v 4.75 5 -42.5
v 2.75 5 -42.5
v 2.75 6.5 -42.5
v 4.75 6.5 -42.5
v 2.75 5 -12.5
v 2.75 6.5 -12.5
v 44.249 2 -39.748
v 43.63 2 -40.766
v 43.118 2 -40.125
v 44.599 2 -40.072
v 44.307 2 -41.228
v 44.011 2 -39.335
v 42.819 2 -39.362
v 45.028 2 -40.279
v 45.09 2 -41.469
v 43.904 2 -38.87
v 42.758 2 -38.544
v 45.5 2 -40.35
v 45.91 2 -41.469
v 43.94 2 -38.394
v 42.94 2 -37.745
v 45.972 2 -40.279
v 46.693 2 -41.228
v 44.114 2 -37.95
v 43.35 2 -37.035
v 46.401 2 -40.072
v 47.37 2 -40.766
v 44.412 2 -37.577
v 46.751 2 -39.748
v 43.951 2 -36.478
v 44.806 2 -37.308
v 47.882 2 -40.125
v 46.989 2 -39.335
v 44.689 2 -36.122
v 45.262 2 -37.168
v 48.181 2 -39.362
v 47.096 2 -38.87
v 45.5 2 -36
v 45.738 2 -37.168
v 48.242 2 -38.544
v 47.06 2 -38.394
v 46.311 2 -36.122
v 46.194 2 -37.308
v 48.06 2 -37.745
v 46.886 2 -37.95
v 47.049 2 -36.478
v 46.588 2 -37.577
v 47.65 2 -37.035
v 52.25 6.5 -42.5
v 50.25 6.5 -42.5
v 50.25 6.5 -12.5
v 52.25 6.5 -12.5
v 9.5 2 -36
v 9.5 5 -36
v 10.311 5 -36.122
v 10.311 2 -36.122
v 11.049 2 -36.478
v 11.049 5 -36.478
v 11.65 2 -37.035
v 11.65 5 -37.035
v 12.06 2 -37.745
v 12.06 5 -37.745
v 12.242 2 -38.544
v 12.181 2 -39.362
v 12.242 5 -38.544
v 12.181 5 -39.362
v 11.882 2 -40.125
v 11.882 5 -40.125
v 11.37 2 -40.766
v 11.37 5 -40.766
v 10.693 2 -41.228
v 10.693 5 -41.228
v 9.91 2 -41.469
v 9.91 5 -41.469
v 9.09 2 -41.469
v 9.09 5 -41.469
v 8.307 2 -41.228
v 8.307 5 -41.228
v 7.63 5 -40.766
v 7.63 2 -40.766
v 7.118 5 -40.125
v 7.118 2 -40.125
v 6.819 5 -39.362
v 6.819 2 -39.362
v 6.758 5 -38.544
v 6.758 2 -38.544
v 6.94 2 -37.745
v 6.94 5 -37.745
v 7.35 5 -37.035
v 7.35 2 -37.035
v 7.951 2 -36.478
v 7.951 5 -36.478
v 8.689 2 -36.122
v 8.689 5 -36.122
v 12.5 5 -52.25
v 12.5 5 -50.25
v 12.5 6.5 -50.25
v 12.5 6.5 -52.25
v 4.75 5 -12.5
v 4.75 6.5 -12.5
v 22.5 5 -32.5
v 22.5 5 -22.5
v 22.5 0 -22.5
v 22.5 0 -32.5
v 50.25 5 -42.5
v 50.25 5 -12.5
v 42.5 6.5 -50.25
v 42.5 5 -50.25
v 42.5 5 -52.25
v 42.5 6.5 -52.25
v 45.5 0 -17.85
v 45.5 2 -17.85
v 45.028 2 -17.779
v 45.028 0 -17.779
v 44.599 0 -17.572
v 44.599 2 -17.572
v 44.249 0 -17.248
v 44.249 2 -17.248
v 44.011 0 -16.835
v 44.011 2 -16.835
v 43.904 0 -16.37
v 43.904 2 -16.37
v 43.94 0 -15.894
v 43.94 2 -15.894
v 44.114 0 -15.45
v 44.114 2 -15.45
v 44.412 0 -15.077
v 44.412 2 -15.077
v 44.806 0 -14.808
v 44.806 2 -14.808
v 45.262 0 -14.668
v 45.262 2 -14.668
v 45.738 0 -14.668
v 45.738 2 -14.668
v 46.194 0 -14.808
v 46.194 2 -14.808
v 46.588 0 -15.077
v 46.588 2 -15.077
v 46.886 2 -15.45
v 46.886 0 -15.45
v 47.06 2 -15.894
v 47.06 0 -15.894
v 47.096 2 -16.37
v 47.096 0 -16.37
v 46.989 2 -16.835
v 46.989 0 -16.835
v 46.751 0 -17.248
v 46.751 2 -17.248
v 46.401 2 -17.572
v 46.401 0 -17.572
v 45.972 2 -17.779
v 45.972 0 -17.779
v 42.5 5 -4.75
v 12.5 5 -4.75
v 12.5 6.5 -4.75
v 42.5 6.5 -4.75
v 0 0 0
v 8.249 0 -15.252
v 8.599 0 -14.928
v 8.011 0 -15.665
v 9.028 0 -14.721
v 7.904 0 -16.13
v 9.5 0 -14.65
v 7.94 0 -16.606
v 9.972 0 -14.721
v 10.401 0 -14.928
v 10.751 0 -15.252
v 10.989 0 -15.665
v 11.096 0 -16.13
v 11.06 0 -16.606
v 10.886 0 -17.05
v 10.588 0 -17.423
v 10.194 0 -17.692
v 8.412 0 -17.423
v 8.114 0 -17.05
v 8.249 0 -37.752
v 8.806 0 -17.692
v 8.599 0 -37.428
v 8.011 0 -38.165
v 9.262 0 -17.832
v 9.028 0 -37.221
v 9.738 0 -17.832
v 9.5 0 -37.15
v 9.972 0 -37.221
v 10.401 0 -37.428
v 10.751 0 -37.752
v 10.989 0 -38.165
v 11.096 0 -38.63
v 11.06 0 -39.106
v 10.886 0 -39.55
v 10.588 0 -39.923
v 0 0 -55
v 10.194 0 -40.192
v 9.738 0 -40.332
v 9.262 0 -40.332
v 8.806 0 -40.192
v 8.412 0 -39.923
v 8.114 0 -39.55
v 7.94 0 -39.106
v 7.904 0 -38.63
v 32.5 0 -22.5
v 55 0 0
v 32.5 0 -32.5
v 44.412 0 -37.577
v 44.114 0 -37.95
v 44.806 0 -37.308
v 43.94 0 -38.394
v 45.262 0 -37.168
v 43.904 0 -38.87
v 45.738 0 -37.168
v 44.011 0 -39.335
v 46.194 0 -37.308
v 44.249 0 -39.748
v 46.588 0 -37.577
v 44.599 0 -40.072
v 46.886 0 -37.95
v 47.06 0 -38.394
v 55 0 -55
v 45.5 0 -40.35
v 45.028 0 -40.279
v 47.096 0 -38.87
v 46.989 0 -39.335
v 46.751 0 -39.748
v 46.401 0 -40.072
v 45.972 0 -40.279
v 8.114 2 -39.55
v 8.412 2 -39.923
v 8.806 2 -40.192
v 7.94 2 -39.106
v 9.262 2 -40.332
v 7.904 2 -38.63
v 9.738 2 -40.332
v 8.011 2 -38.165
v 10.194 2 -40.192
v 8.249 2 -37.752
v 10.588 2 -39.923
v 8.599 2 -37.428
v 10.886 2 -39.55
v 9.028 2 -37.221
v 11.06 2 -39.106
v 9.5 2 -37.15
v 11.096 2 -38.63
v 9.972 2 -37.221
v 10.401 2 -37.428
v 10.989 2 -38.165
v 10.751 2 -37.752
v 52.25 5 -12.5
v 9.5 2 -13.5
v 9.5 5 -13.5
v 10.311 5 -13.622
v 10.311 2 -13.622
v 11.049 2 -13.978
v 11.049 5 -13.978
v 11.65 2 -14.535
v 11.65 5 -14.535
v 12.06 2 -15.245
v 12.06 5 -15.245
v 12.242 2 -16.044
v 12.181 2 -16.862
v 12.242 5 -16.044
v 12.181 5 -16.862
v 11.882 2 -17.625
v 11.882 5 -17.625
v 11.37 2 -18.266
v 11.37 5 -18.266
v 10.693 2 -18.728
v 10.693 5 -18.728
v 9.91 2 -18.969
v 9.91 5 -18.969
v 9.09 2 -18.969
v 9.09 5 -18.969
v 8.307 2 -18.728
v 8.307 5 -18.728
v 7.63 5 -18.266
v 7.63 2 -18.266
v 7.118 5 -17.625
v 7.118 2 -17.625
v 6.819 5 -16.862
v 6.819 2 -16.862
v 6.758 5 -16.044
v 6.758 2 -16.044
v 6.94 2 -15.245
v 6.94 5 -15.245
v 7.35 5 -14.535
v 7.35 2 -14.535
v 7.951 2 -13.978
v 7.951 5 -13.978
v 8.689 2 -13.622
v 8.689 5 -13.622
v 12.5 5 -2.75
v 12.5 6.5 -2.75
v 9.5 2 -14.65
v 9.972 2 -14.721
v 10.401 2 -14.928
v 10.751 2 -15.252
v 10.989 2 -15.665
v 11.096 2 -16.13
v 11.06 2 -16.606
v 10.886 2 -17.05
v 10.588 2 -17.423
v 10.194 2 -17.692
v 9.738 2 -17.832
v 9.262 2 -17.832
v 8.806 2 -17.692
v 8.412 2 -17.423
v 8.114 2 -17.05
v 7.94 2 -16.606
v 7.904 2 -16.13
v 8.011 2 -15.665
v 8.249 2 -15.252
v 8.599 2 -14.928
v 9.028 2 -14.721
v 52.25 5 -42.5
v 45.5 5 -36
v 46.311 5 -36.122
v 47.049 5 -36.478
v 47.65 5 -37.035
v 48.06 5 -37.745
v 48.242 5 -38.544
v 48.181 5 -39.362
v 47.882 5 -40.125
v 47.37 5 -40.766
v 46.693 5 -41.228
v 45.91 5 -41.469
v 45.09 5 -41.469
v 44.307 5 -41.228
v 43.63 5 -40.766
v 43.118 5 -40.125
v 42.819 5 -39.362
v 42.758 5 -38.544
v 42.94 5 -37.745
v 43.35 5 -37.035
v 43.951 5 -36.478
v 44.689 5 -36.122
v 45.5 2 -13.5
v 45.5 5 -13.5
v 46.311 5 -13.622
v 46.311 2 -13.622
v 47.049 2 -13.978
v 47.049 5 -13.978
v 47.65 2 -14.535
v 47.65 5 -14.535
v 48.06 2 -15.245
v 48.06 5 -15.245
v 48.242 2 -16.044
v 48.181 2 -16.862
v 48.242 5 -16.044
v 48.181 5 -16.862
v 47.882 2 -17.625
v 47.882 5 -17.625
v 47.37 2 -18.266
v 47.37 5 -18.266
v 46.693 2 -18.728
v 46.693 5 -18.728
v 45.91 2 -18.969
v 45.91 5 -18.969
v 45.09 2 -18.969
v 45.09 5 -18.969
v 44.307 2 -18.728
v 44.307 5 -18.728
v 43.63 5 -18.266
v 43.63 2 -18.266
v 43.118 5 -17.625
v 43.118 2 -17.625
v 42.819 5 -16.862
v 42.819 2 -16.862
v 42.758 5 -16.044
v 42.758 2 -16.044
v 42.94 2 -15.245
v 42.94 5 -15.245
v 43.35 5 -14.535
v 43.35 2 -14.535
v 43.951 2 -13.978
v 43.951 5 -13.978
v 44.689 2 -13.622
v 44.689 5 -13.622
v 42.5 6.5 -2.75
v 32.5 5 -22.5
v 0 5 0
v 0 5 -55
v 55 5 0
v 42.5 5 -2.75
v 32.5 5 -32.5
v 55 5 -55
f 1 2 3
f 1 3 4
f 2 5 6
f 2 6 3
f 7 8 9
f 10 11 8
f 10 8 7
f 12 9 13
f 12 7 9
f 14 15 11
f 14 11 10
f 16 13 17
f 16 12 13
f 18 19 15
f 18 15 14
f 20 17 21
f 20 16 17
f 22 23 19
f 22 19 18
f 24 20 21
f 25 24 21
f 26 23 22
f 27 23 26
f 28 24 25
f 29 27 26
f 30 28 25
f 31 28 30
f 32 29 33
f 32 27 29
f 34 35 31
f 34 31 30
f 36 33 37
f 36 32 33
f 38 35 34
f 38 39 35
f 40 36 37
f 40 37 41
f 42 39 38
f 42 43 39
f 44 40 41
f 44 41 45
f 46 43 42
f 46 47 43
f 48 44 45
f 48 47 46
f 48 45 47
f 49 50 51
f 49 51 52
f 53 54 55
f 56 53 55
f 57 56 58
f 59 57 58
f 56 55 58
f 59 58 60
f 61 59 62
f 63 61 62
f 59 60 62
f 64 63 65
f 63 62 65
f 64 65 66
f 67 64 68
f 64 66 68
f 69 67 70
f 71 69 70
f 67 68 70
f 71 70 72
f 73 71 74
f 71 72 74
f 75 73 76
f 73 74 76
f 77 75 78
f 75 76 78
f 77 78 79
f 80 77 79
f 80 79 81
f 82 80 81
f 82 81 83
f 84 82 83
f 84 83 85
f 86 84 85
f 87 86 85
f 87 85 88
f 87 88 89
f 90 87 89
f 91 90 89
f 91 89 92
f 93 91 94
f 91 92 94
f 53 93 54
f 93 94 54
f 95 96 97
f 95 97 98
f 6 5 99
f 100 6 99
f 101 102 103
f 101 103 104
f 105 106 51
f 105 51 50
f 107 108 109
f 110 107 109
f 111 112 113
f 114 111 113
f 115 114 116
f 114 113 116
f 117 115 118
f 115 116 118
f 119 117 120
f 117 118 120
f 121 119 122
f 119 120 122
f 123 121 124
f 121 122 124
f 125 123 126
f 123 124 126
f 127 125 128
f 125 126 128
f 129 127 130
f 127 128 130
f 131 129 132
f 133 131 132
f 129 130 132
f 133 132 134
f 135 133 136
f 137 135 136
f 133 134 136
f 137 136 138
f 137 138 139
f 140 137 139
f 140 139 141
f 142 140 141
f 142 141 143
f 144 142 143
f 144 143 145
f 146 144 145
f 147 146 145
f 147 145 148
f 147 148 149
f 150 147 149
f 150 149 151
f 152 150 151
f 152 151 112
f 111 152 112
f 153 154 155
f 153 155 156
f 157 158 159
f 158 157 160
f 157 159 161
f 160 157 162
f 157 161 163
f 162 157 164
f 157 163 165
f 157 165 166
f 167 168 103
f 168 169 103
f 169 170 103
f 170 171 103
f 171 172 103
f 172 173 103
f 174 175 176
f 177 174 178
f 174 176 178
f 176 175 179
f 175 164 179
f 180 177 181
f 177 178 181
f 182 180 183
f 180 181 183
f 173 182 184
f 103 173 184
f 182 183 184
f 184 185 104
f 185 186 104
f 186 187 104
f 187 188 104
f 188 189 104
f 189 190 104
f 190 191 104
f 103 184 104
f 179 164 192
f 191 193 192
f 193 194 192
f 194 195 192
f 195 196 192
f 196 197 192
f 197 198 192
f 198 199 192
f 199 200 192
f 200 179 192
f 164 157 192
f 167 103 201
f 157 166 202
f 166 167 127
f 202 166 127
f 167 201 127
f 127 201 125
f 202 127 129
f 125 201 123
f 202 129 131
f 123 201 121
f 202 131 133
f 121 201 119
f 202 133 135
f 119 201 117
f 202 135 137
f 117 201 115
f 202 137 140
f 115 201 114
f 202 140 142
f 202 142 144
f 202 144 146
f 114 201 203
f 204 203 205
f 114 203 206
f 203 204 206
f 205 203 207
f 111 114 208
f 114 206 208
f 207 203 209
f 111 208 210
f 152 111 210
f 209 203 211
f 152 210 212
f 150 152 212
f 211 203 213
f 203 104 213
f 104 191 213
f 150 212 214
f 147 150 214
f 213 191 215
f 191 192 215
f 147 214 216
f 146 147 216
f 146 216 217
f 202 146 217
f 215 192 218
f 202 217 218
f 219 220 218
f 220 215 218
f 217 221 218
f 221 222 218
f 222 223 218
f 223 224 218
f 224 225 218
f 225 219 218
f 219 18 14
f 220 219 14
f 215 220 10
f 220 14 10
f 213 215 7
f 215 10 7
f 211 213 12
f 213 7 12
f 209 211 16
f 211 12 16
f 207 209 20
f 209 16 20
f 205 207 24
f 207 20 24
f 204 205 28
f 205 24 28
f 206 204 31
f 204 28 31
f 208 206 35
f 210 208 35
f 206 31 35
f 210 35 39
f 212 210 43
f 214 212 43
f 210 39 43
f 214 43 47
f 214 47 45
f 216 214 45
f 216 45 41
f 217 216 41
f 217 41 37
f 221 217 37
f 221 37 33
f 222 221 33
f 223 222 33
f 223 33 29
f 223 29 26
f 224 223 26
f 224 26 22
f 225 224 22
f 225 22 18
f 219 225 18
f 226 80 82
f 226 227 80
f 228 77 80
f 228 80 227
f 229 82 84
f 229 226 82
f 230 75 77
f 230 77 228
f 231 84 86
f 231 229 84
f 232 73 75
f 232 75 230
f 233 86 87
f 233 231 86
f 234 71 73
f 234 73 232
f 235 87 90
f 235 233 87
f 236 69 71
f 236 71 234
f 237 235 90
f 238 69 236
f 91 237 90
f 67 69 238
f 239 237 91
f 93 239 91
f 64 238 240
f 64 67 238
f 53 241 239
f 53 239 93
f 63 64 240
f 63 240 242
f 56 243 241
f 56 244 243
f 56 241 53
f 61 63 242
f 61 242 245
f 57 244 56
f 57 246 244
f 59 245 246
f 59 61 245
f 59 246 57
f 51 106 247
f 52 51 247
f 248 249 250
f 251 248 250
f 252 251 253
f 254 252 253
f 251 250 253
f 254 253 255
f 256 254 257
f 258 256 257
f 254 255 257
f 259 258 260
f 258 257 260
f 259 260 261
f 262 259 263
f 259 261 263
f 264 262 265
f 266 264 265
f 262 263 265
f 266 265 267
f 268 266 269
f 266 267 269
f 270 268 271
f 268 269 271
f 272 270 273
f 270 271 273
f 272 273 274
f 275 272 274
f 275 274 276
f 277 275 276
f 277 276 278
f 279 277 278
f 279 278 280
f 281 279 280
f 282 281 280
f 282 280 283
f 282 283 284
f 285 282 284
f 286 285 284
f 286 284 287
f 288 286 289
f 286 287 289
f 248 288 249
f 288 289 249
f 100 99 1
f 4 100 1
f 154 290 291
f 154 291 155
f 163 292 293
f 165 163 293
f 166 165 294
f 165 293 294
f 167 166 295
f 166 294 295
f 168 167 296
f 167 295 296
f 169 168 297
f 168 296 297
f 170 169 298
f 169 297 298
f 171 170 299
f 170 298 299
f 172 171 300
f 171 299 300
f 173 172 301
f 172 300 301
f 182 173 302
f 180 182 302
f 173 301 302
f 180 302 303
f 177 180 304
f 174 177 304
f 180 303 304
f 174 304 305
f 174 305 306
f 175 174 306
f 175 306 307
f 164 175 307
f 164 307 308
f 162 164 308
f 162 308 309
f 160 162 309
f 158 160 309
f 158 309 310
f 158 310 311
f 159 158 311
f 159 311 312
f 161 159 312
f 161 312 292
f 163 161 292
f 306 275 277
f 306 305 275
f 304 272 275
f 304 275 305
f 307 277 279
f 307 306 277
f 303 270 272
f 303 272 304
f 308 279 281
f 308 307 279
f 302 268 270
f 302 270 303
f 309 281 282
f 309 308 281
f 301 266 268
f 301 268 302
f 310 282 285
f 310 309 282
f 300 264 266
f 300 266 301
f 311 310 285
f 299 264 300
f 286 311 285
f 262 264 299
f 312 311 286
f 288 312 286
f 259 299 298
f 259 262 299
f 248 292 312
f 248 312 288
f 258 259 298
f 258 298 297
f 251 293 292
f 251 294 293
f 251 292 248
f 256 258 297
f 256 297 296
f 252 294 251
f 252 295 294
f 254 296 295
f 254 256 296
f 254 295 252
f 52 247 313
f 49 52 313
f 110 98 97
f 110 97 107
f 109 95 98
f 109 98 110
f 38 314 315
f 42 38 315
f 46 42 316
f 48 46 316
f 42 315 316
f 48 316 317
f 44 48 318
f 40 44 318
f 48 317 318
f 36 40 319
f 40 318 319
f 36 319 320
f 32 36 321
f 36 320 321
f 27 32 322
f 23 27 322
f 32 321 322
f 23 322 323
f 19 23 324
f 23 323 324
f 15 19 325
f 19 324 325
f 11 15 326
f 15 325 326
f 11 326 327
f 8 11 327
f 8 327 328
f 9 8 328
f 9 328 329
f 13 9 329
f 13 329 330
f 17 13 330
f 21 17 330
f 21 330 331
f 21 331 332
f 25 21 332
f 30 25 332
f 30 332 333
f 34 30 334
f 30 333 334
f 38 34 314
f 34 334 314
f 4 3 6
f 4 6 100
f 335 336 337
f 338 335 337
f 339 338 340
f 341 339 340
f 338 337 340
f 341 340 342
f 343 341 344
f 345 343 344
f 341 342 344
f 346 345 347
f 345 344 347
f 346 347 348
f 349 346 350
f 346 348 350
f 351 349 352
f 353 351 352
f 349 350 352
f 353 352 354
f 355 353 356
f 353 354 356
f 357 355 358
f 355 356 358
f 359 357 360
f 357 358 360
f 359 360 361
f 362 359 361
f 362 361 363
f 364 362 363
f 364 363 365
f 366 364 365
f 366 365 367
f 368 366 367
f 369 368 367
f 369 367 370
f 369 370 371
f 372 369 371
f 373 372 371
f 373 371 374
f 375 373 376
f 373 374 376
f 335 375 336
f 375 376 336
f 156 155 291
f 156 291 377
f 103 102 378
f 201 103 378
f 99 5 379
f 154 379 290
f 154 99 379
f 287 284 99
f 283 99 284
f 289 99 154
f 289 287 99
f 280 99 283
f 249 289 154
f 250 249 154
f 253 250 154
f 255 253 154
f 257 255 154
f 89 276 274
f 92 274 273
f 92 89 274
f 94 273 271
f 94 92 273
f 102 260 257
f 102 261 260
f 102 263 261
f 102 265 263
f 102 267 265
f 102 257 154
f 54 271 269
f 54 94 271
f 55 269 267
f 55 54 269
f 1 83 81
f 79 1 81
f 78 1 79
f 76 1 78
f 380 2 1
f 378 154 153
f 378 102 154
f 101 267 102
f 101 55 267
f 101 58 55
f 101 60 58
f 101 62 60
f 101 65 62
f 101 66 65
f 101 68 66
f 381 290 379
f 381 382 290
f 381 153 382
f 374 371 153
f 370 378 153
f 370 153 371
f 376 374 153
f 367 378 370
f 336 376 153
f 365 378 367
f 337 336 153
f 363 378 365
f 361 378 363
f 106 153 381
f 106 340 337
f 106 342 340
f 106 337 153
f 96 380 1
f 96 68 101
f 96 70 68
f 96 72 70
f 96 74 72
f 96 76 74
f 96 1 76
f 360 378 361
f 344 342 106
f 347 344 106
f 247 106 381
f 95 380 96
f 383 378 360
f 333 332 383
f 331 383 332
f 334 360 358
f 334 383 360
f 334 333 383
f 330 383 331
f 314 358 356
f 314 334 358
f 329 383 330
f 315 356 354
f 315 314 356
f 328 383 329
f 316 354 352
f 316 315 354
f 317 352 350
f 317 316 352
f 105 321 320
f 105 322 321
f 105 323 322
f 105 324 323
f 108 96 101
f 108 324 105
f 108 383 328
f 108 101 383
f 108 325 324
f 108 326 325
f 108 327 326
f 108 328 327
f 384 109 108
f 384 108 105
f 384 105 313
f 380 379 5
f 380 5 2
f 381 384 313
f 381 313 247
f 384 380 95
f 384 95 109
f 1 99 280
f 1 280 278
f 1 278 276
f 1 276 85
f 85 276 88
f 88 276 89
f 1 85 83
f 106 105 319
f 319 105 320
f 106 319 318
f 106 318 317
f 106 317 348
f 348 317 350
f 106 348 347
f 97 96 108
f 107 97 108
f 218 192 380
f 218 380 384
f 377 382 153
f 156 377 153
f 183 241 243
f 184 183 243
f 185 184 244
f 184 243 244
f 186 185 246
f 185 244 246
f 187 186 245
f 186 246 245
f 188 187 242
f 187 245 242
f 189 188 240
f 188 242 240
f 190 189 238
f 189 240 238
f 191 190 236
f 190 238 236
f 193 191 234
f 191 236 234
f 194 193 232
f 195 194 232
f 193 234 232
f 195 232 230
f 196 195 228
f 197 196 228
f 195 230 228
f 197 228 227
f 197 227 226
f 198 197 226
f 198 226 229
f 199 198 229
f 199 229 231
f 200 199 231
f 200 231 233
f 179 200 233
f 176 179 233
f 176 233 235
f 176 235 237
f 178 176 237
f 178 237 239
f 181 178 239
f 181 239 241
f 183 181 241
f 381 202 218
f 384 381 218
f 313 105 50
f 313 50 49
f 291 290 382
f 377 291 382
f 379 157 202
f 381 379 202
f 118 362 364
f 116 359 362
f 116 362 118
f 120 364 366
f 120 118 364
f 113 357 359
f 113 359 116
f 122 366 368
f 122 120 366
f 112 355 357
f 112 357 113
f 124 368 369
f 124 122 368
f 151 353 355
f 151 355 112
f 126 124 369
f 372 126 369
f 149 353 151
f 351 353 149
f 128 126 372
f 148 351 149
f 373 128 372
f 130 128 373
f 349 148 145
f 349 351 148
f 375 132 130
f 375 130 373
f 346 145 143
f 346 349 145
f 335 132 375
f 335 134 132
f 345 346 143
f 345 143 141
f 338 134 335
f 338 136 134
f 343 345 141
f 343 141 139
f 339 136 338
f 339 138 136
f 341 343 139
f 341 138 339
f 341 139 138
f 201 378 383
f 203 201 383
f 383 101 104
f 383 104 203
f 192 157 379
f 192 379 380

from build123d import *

# Parameters (mm, degrees)
CROQUIS1_W              = 55
CROQUIS1_H              = 55
SALIENTE_EXTRUIR1_DEPTH = 5
CROQUIS2_W              = 30
CROQUIS2_H              = 2
CROQUIS2_W_2            = 2
CROQUIS2_H_2            = 30
SALIENTE_EXTRUIR2_DEPTH = 1.5
CROQUIS3_R              = 1.6
CORTAR_EXTRUIR1_DEPTH   = 5
CROQUIS6_W              = 10
CROQUIS6_H              = 10
CORTAR_EXTRUIR4_DEPTH   = 10
CROQUIS7_R              = 2.75
CORTAR_EXTRUIR5_DEPTH   = 3


with BuildPart() as part:
    # Croquis1 → Saliente-Extruir1 (new body)
    with BuildSketch(Plane(origin=(0, 0, 0), x_dir=(1, 0, 0), z_dir=(0, 1, 0))):
        with Locations((27.5, 27.5)):
            Rectangle(CROQUIS1_W, CROQUIS1_H)
    extrude(amount=SALIENTE_EXTRUIR1_DEPTH)

    # Croquis2 → Saliente-Extruir2 (add)
    with BuildSketch(Plane(origin=(0, 5, 0), x_dir=(1, 0, 0), z_dir=(0, 1, 0))):
        with Locations((27.5, 51.25)):
            Rectangle(CROQUIS2_W, CROQUIS2_H)
        with Locations((3.75, 27.5)):
            Rectangle(CROQUIS2_W_2, CROQUIS2_H_2)
        with Locations((51.25, 27.5)):
            Rectangle(CROQUIS2_W_2, CROQUIS2_H_2)
        with Locations((27.5, 3.75)):
            Rectangle(CROQUIS2_W, CROQUIS2_H)
    extrude(amount=SALIENTE_EXTRUIR2_DEPTH)

    # Croquis3 → Cortar-Extruir1 (cut)
    with BuildSketch(Plane(origin=(0, 5, 0), x_dir=(1, 0, 0), z_dir=(0, 1, 0))):
        with Locations(Location((9.5, 38.75, 0), (0, 0, 270))):
            Circle(CROQUIS3_R)
        with Locations(Location((9.5, 16.25, 0), (0, 0, 270))):
            Circle(CROQUIS3_R)
        with Locations(Location((45.5, 38.75, 0), (0, 0, 90))):
            Circle(CROQUIS3_R)
        with Locations(Location((45.5, 16.25, 0), (0, 0, 90))):
            Circle(CROQUIS3_R)
    extrude(amount=-CORTAR_EXTRUIR1_DEPTH, mode=Mode.SUBTRACT)

    # Croquis6 → Cortar-Extruir4 (cut)
    with BuildSketch(Plane(origin=(0, 5, 0), x_dir=(1, 0, 0), z_dir=(0, 1, 0))):
        with Locations((27.5, 27.5)):
            Rectangle(CROQUIS6_W, CROQUIS6_H)
    extrude(amount=-CORTAR_EXTRUIR4_DEPTH, mode=Mode.SUBTRACT)

    # Croquis7 → Cortar-Extruir5 (cut)
    with BuildSketch(Plane(origin=(0, 5, 0), x_dir=(1, 0, 0), z_dir=(0, 1, 0))):
        with Locations(Location((9.5, 38.75, 0), (0, 0, 270))):
            Circle(CROQUIS7_R)
        with Locations(Location((45.5, 38.75, 0), (0, 0, 270))):
            Circle(CROQUIS7_R)
        with Locations(Location((45.5, 16.25, 0), (0, 0, 270))):
            Circle(CROQUIS7_R)
        with Locations(Location((9.5, 16.25, 0), (0, 0, 270))):
            Circle(CROQUIS7_R)
    extrude(amount=-CORTAR_EXTRUIR5_DEPTH, mode=Mode.SUBTRACT)


solid = part.part
